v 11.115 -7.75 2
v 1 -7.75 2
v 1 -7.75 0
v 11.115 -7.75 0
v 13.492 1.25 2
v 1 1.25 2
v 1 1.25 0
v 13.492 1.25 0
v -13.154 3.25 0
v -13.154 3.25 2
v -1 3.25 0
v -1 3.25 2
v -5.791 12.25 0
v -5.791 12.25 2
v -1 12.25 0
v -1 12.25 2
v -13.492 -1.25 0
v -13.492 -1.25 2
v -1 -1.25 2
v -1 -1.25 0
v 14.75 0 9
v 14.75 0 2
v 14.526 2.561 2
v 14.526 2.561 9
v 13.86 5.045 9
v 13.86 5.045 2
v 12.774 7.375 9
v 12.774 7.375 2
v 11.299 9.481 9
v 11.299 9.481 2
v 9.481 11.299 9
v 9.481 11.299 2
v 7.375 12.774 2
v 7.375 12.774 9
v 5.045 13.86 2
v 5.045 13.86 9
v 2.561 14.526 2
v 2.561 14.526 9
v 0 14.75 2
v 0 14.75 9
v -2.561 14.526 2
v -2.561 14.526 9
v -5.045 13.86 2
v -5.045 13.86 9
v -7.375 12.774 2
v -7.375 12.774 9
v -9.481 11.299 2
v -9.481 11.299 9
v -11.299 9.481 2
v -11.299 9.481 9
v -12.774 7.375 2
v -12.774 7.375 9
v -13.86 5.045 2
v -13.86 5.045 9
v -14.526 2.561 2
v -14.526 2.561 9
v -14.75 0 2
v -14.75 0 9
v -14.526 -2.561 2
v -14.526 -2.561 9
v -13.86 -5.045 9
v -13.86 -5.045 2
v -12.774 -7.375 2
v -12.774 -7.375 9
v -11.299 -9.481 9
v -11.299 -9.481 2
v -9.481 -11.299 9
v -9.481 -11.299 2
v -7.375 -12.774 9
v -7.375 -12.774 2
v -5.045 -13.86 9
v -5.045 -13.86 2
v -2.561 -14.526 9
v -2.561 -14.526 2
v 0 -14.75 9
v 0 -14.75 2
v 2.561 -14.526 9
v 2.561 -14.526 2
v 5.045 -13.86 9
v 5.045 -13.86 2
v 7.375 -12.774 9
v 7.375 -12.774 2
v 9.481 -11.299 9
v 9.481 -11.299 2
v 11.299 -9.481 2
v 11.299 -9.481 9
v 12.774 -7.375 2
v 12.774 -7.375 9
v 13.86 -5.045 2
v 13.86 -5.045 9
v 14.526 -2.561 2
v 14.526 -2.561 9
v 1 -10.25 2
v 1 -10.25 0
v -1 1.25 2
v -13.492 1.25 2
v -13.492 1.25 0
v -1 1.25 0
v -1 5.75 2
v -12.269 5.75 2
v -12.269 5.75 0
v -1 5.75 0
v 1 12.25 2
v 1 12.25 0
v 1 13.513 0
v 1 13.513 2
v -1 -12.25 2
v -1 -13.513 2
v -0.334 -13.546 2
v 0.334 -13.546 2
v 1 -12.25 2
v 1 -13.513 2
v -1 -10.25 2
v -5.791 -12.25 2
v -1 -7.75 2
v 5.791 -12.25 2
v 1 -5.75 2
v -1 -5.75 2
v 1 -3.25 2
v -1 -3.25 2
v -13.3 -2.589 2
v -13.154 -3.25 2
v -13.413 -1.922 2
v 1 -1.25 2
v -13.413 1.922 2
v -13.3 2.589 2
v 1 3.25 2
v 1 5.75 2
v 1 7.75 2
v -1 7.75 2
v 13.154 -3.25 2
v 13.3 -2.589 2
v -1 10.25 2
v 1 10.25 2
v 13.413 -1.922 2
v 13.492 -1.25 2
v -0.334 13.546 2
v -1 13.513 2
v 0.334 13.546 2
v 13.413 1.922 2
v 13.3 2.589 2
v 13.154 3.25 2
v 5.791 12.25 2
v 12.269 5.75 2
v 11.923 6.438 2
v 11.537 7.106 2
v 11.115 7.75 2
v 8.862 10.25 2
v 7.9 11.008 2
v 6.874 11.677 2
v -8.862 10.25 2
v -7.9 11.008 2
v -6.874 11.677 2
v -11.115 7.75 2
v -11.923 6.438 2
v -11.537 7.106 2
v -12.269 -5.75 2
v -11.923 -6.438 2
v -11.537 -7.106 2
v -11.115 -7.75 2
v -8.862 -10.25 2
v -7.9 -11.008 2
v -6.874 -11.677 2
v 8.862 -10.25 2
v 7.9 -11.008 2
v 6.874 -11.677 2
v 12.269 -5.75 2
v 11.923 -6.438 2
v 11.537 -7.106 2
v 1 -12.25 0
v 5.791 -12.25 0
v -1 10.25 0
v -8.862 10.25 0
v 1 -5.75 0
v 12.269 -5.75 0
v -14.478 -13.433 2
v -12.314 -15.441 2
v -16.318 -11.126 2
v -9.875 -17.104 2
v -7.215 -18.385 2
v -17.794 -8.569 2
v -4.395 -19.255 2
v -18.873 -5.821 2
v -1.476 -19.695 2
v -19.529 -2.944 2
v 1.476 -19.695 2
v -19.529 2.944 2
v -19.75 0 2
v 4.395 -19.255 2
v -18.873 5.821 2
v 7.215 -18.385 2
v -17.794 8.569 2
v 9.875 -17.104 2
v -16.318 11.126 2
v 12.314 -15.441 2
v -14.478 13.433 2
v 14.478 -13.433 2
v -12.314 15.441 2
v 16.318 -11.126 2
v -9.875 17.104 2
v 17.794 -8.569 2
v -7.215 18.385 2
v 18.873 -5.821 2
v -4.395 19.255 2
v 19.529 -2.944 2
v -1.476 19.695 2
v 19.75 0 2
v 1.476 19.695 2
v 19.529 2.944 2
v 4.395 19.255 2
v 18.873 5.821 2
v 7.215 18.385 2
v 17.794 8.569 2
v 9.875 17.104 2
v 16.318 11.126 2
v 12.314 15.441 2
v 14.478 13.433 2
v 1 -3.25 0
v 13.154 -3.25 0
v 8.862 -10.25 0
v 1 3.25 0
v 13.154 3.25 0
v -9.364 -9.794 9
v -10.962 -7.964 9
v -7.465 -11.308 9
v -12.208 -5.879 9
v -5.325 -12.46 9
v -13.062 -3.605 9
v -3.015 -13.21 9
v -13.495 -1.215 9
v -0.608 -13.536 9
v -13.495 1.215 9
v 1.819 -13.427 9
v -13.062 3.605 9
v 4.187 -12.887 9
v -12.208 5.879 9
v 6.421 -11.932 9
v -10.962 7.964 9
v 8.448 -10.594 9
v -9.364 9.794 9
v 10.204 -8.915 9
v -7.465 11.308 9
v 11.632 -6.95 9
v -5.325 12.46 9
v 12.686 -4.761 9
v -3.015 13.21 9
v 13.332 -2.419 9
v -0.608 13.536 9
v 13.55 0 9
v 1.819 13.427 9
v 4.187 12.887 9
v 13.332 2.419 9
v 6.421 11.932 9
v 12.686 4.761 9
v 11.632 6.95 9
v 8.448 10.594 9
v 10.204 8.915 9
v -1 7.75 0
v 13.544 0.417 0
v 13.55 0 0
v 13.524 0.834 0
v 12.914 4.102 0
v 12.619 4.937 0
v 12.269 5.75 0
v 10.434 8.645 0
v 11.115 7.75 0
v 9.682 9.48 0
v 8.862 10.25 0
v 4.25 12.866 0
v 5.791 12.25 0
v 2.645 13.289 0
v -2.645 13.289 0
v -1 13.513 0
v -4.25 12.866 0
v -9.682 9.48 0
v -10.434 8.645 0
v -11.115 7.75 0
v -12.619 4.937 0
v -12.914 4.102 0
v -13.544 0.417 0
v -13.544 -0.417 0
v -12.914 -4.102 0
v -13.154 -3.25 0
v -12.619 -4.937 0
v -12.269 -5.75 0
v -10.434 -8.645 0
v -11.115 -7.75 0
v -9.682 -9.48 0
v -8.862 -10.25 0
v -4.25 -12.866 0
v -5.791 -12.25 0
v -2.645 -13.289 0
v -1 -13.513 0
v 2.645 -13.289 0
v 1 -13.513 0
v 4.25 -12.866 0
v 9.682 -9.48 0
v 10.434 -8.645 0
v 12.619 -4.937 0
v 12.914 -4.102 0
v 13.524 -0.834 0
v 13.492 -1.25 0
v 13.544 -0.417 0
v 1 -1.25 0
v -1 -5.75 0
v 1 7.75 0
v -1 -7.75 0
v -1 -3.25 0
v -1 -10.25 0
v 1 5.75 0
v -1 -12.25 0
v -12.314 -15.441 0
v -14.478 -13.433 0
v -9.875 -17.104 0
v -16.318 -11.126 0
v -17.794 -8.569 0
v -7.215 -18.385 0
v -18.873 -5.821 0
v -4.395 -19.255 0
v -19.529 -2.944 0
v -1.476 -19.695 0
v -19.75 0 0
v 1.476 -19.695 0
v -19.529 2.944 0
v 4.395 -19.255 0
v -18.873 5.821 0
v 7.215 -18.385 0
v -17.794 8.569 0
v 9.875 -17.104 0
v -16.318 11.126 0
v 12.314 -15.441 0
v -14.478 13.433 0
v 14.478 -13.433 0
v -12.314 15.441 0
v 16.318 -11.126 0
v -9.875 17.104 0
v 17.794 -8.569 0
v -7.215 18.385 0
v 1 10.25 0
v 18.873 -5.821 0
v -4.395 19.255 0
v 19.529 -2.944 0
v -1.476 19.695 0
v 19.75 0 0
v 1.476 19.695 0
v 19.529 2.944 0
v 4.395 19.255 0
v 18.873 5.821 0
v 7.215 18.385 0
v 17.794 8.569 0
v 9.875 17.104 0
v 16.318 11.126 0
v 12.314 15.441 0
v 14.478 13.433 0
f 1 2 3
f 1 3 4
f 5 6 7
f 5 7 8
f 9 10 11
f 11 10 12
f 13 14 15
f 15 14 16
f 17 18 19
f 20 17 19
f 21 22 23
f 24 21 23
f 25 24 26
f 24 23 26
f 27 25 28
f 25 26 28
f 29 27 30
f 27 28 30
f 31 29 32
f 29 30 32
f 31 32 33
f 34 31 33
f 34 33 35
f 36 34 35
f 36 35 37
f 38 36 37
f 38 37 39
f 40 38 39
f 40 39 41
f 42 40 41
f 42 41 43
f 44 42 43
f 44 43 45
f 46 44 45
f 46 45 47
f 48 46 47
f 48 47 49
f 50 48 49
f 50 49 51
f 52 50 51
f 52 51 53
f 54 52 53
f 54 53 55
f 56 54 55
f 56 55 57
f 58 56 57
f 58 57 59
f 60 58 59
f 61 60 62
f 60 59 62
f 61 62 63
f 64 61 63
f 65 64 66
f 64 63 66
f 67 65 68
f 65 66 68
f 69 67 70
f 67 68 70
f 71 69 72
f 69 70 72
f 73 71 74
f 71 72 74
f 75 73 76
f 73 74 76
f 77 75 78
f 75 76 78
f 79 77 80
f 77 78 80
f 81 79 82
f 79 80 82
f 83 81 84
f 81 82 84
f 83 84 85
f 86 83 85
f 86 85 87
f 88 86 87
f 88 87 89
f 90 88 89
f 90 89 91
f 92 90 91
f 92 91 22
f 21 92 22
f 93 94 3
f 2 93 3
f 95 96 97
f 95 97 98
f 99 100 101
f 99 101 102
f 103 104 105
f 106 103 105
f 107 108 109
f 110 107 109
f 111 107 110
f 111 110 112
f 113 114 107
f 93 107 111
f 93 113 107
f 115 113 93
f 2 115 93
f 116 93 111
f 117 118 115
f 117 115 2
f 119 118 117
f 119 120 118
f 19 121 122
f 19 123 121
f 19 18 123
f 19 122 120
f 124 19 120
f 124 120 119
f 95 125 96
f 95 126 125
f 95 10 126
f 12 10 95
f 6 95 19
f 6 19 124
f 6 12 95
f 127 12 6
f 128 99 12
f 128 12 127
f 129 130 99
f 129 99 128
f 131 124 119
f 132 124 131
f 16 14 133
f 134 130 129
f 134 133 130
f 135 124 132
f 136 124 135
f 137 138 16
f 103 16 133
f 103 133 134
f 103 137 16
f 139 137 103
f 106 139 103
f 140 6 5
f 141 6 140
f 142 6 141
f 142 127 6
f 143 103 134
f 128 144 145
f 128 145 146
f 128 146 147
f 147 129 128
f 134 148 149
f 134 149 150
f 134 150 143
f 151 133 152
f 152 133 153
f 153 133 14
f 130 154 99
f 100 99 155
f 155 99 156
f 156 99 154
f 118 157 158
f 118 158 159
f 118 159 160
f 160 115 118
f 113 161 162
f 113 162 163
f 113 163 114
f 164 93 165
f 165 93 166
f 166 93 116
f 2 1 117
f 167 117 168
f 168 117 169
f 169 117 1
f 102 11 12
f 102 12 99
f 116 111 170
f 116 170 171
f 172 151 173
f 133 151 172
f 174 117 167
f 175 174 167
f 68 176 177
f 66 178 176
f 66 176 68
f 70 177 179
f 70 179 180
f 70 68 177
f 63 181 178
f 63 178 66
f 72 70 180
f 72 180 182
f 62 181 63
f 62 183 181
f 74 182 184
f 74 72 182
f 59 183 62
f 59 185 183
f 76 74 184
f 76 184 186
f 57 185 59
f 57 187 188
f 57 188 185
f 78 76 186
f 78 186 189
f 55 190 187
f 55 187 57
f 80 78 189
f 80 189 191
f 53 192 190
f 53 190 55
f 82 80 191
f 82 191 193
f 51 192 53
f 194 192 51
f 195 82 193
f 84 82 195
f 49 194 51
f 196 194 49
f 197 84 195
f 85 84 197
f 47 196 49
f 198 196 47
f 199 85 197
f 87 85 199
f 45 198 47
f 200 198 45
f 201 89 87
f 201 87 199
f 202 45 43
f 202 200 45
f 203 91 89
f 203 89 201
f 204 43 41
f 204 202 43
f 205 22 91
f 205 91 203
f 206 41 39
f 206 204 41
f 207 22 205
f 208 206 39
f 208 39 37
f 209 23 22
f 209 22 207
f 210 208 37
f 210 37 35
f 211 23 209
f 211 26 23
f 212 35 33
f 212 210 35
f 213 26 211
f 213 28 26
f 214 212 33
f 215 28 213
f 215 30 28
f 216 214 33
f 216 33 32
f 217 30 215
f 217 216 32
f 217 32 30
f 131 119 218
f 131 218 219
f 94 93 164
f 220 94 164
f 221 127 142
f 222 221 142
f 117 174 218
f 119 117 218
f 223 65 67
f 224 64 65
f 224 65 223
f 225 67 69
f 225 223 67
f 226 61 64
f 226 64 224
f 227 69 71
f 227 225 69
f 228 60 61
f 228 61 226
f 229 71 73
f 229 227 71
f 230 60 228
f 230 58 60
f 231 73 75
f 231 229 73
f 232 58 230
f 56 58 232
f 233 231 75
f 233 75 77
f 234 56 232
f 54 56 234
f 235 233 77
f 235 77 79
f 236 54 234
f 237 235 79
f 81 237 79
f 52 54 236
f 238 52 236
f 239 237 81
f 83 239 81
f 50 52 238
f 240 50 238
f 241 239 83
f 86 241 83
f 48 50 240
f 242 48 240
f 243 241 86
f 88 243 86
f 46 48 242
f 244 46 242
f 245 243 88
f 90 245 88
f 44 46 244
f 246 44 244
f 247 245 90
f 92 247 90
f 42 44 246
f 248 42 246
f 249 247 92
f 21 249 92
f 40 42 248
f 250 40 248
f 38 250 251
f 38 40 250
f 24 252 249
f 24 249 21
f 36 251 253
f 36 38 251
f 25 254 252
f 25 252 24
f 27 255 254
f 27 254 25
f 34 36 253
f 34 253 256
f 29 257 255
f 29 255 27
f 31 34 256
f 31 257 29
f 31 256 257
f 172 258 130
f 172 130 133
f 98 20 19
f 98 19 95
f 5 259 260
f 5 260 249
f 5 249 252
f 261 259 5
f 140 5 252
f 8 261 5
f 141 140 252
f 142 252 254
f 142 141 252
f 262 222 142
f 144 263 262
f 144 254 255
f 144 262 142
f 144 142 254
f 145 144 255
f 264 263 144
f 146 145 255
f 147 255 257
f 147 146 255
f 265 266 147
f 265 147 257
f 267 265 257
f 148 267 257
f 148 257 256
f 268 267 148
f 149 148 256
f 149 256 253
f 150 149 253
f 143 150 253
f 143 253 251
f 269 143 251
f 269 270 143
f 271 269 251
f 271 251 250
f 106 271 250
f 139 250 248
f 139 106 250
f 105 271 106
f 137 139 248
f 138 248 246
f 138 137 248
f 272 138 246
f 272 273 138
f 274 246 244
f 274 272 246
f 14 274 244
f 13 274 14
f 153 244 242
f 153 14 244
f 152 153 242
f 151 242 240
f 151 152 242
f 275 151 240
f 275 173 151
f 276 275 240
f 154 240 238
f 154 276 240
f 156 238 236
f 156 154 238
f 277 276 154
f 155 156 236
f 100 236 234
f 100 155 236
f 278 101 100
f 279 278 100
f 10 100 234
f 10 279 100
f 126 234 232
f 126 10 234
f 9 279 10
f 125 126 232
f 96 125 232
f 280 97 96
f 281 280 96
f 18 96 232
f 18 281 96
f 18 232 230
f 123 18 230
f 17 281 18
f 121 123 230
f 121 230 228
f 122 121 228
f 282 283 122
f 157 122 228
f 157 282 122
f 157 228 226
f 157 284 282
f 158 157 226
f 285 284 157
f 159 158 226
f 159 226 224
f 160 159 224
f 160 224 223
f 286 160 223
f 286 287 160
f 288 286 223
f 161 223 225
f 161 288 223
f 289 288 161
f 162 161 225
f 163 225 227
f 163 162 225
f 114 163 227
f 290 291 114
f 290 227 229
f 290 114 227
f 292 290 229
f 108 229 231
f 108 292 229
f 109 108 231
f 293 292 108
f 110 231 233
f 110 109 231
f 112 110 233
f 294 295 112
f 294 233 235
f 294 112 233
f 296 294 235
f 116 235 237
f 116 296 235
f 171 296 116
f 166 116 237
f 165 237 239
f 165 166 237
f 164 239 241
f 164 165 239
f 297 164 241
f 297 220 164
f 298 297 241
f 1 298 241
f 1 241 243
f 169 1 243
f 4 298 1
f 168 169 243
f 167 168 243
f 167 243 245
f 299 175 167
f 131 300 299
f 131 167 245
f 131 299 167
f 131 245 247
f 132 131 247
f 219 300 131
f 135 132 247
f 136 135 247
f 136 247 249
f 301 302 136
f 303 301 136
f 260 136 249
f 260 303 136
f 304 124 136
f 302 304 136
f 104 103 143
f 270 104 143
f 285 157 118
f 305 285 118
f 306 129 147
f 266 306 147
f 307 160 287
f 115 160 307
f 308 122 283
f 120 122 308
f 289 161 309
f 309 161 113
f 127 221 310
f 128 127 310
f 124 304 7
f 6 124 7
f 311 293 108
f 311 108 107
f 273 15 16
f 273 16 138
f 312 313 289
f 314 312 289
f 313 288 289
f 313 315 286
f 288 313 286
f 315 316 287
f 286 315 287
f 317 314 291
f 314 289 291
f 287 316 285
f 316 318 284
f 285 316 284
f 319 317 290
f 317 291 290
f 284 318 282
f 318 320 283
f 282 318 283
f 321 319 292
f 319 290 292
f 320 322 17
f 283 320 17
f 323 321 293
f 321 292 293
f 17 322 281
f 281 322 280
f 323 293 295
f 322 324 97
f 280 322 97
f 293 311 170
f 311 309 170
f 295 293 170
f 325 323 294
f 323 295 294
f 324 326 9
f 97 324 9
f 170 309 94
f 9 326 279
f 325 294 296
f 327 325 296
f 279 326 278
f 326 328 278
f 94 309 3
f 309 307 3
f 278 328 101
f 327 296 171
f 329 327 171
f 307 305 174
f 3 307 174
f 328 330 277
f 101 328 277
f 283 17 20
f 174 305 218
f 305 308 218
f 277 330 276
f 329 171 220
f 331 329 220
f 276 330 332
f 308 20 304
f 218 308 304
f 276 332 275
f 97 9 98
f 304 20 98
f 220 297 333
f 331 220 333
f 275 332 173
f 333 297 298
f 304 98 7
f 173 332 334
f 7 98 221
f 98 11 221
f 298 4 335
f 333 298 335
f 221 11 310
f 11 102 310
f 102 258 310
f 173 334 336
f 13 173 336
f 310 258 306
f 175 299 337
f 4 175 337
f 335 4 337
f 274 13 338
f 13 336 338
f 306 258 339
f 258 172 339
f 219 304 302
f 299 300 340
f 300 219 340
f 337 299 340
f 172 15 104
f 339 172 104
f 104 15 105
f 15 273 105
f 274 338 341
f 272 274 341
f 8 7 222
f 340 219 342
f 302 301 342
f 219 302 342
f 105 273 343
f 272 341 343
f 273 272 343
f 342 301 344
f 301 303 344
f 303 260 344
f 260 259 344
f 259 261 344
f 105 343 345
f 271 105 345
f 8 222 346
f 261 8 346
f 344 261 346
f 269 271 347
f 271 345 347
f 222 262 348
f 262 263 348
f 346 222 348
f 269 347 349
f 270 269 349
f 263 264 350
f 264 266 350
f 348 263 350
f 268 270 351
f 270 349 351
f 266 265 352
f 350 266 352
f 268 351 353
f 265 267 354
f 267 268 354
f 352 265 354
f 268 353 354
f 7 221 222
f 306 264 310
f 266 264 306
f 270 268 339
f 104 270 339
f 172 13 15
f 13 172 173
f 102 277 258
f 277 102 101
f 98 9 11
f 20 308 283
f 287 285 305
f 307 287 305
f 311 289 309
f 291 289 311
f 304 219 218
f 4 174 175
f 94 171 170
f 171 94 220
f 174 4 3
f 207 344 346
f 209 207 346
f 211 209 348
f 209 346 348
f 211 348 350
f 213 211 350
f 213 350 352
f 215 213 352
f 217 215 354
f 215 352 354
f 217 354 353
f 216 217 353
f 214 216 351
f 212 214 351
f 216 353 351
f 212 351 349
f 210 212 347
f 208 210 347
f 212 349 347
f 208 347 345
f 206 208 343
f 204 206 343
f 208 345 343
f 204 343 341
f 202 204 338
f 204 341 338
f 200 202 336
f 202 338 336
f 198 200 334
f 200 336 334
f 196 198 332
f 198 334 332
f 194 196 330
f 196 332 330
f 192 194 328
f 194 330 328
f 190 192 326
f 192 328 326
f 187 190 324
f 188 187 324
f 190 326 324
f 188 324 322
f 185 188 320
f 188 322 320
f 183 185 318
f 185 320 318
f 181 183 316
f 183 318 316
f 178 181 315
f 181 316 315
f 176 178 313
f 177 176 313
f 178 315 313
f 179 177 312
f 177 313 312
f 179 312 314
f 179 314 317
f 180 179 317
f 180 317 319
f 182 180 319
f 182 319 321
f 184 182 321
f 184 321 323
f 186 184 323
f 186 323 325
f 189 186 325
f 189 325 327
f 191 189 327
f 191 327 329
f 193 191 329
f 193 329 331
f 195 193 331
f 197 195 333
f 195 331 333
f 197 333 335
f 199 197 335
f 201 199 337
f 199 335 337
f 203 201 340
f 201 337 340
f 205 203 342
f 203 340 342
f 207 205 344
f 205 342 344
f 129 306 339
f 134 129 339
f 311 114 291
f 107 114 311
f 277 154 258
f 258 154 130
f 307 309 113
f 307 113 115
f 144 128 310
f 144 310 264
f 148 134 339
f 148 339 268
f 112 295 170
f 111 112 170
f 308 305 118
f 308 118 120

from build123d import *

# Parameters (mm, degrees)
F0_R      = 19.75
F1_DEPTH  = 2
F3_W      = 29.5
F3_H      = 2
F4_DEPTH  = 2
F5_R      = 14.75
F6_DEPTH  = 2
F9_R      = 14.75
F9_R_2    = 13.55
F10_DEPTH = 9
F11_W     = 2
F11_H     = 33.5
F12_DEPTH = 2


with BuildPart() as f1:
    # F0 (on Top) → F1 (new body)
    with BuildSketch(Plane.XY):
        Circle(F0_R)
    extrude(amount=F1_DEPTH)


with BuildPart() as f4:
    # F3 (on face) → F4 (new body, through all)
    with BuildSketch(Plane.XY.offset(2)):
        with Locations((0, -15.75)):
            Rectangle(F3_W, F3_H)
    extrude(amount=-F4_DEPTH)


with BuildPart() as f4b:
    # F3 (on face) → F4, piece 2 (new body, through all)
    with BuildSketch(Plane.XY.offset(2)):
        with Locations((0, -11.25)):
            Rectangle(F3_W, F3_H)
    extrude(amount=-F4_DEPTH)


with BuildPart() as f4c:
    # F3 (on face) → F4, piece 3 (new body, through all)
    with BuildSketch(Plane.XY.offset(2)):
        with Locations((0, -6.75)):
            Rectangle(F3_W, F3_H)
    extrude(amount=-F4_DEPTH)


with BuildPart() as f4d:
    # F3 (on face) → F4, piece 4 (new body, through all)
    with BuildSketch(Plane.XY.offset(2)):
        with Locations((0, -2.25)):
            Rectangle(F3_W, F3_H)
    extrude(amount=-F4_DEPTH)


with BuildPart() as f4e:
    # F3 (on face) → F4, piece 5 (new body, through all)
    with BuildSketch(Plane.XY.offset(2)):
        with Locations((0, 2.25)):
            Rectangle(F3_W, F3_H)
    extrude(amount=-F4_DEPTH)


with BuildPart() as f4f:
    # F3 (on face) → F4, piece 6 (new body, through all)
    with BuildSketch(Plane.XY.offset(2)):
        with Locations((0, 6.75)):
            Rectangle(F3_W, F3_H)
    extrude(amount=-F4_DEPTH)


with BuildPart() as f4g:
    # F3 (on face) → F4, piece 7 (new body, through all)
    with BuildSketch(Plane.XY.offset(2)):
        with Locations((0, 11.25)):
            Rectangle(F3_W, F3_H)
    extrude(amount=-F4_DEPTH)


with BuildPart() as f4h:
    # F3 (on face) → F4, piece 8 (new body, through all)
    with BuildSketch(Plane.XY.offset(2)):
        with Locations((0, 15.75)):
            Rectangle(F3_W, F3_H)
    extrude(amount=-F4_DEPTH)


with BuildPart() as f6:
    # F5 (on Top) → F6 (new body, through all)
    with BuildSketch(Plane.XY):
        Circle(F5_R)
    extrude(amount=F6_DEPTH)

    # F7: cut F4h, F4g, F4f, F4e, F4d, F4c, F4b, F4
    add(f4h.part, mode=Mode.SUBTRACT)
    add(f4g.part, mode=Mode.SUBTRACT)
    add(f4f.part, mode=Mode.SUBTRACT)
    add(f4e.part, mode=Mode.SUBTRACT)
    add(f4d.part, mode=Mode.SUBTRACT)
    add(f4c.part, mode=Mode.SUBTRACT)
    add(f4b.part, mode=Mode.SUBTRACT)
    add(f4.part, mode=Mode.SUBTRACT)


with BuildPart() as f1_1:
    add(f1.part)

    # F8: cut F6
    add(f6.part, mode=Mode.SUBTRACT)

    # F9 (on face) → F10 (join, through all)
    with BuildSketch(Plane.XY):
        Circle(F9_R)
        Circle(F9_R_2, mode=Mode.SUBTRACT)
    extrude(amount=F10_DEPTH)

    # F11 (on face) → F12 (join, through all)
    with BuildSketch(Plane.XY):
        Rectangle(F11_W, F11_H)
    extrude(amount=F12_DEPTH)


solid = f1_1.part
